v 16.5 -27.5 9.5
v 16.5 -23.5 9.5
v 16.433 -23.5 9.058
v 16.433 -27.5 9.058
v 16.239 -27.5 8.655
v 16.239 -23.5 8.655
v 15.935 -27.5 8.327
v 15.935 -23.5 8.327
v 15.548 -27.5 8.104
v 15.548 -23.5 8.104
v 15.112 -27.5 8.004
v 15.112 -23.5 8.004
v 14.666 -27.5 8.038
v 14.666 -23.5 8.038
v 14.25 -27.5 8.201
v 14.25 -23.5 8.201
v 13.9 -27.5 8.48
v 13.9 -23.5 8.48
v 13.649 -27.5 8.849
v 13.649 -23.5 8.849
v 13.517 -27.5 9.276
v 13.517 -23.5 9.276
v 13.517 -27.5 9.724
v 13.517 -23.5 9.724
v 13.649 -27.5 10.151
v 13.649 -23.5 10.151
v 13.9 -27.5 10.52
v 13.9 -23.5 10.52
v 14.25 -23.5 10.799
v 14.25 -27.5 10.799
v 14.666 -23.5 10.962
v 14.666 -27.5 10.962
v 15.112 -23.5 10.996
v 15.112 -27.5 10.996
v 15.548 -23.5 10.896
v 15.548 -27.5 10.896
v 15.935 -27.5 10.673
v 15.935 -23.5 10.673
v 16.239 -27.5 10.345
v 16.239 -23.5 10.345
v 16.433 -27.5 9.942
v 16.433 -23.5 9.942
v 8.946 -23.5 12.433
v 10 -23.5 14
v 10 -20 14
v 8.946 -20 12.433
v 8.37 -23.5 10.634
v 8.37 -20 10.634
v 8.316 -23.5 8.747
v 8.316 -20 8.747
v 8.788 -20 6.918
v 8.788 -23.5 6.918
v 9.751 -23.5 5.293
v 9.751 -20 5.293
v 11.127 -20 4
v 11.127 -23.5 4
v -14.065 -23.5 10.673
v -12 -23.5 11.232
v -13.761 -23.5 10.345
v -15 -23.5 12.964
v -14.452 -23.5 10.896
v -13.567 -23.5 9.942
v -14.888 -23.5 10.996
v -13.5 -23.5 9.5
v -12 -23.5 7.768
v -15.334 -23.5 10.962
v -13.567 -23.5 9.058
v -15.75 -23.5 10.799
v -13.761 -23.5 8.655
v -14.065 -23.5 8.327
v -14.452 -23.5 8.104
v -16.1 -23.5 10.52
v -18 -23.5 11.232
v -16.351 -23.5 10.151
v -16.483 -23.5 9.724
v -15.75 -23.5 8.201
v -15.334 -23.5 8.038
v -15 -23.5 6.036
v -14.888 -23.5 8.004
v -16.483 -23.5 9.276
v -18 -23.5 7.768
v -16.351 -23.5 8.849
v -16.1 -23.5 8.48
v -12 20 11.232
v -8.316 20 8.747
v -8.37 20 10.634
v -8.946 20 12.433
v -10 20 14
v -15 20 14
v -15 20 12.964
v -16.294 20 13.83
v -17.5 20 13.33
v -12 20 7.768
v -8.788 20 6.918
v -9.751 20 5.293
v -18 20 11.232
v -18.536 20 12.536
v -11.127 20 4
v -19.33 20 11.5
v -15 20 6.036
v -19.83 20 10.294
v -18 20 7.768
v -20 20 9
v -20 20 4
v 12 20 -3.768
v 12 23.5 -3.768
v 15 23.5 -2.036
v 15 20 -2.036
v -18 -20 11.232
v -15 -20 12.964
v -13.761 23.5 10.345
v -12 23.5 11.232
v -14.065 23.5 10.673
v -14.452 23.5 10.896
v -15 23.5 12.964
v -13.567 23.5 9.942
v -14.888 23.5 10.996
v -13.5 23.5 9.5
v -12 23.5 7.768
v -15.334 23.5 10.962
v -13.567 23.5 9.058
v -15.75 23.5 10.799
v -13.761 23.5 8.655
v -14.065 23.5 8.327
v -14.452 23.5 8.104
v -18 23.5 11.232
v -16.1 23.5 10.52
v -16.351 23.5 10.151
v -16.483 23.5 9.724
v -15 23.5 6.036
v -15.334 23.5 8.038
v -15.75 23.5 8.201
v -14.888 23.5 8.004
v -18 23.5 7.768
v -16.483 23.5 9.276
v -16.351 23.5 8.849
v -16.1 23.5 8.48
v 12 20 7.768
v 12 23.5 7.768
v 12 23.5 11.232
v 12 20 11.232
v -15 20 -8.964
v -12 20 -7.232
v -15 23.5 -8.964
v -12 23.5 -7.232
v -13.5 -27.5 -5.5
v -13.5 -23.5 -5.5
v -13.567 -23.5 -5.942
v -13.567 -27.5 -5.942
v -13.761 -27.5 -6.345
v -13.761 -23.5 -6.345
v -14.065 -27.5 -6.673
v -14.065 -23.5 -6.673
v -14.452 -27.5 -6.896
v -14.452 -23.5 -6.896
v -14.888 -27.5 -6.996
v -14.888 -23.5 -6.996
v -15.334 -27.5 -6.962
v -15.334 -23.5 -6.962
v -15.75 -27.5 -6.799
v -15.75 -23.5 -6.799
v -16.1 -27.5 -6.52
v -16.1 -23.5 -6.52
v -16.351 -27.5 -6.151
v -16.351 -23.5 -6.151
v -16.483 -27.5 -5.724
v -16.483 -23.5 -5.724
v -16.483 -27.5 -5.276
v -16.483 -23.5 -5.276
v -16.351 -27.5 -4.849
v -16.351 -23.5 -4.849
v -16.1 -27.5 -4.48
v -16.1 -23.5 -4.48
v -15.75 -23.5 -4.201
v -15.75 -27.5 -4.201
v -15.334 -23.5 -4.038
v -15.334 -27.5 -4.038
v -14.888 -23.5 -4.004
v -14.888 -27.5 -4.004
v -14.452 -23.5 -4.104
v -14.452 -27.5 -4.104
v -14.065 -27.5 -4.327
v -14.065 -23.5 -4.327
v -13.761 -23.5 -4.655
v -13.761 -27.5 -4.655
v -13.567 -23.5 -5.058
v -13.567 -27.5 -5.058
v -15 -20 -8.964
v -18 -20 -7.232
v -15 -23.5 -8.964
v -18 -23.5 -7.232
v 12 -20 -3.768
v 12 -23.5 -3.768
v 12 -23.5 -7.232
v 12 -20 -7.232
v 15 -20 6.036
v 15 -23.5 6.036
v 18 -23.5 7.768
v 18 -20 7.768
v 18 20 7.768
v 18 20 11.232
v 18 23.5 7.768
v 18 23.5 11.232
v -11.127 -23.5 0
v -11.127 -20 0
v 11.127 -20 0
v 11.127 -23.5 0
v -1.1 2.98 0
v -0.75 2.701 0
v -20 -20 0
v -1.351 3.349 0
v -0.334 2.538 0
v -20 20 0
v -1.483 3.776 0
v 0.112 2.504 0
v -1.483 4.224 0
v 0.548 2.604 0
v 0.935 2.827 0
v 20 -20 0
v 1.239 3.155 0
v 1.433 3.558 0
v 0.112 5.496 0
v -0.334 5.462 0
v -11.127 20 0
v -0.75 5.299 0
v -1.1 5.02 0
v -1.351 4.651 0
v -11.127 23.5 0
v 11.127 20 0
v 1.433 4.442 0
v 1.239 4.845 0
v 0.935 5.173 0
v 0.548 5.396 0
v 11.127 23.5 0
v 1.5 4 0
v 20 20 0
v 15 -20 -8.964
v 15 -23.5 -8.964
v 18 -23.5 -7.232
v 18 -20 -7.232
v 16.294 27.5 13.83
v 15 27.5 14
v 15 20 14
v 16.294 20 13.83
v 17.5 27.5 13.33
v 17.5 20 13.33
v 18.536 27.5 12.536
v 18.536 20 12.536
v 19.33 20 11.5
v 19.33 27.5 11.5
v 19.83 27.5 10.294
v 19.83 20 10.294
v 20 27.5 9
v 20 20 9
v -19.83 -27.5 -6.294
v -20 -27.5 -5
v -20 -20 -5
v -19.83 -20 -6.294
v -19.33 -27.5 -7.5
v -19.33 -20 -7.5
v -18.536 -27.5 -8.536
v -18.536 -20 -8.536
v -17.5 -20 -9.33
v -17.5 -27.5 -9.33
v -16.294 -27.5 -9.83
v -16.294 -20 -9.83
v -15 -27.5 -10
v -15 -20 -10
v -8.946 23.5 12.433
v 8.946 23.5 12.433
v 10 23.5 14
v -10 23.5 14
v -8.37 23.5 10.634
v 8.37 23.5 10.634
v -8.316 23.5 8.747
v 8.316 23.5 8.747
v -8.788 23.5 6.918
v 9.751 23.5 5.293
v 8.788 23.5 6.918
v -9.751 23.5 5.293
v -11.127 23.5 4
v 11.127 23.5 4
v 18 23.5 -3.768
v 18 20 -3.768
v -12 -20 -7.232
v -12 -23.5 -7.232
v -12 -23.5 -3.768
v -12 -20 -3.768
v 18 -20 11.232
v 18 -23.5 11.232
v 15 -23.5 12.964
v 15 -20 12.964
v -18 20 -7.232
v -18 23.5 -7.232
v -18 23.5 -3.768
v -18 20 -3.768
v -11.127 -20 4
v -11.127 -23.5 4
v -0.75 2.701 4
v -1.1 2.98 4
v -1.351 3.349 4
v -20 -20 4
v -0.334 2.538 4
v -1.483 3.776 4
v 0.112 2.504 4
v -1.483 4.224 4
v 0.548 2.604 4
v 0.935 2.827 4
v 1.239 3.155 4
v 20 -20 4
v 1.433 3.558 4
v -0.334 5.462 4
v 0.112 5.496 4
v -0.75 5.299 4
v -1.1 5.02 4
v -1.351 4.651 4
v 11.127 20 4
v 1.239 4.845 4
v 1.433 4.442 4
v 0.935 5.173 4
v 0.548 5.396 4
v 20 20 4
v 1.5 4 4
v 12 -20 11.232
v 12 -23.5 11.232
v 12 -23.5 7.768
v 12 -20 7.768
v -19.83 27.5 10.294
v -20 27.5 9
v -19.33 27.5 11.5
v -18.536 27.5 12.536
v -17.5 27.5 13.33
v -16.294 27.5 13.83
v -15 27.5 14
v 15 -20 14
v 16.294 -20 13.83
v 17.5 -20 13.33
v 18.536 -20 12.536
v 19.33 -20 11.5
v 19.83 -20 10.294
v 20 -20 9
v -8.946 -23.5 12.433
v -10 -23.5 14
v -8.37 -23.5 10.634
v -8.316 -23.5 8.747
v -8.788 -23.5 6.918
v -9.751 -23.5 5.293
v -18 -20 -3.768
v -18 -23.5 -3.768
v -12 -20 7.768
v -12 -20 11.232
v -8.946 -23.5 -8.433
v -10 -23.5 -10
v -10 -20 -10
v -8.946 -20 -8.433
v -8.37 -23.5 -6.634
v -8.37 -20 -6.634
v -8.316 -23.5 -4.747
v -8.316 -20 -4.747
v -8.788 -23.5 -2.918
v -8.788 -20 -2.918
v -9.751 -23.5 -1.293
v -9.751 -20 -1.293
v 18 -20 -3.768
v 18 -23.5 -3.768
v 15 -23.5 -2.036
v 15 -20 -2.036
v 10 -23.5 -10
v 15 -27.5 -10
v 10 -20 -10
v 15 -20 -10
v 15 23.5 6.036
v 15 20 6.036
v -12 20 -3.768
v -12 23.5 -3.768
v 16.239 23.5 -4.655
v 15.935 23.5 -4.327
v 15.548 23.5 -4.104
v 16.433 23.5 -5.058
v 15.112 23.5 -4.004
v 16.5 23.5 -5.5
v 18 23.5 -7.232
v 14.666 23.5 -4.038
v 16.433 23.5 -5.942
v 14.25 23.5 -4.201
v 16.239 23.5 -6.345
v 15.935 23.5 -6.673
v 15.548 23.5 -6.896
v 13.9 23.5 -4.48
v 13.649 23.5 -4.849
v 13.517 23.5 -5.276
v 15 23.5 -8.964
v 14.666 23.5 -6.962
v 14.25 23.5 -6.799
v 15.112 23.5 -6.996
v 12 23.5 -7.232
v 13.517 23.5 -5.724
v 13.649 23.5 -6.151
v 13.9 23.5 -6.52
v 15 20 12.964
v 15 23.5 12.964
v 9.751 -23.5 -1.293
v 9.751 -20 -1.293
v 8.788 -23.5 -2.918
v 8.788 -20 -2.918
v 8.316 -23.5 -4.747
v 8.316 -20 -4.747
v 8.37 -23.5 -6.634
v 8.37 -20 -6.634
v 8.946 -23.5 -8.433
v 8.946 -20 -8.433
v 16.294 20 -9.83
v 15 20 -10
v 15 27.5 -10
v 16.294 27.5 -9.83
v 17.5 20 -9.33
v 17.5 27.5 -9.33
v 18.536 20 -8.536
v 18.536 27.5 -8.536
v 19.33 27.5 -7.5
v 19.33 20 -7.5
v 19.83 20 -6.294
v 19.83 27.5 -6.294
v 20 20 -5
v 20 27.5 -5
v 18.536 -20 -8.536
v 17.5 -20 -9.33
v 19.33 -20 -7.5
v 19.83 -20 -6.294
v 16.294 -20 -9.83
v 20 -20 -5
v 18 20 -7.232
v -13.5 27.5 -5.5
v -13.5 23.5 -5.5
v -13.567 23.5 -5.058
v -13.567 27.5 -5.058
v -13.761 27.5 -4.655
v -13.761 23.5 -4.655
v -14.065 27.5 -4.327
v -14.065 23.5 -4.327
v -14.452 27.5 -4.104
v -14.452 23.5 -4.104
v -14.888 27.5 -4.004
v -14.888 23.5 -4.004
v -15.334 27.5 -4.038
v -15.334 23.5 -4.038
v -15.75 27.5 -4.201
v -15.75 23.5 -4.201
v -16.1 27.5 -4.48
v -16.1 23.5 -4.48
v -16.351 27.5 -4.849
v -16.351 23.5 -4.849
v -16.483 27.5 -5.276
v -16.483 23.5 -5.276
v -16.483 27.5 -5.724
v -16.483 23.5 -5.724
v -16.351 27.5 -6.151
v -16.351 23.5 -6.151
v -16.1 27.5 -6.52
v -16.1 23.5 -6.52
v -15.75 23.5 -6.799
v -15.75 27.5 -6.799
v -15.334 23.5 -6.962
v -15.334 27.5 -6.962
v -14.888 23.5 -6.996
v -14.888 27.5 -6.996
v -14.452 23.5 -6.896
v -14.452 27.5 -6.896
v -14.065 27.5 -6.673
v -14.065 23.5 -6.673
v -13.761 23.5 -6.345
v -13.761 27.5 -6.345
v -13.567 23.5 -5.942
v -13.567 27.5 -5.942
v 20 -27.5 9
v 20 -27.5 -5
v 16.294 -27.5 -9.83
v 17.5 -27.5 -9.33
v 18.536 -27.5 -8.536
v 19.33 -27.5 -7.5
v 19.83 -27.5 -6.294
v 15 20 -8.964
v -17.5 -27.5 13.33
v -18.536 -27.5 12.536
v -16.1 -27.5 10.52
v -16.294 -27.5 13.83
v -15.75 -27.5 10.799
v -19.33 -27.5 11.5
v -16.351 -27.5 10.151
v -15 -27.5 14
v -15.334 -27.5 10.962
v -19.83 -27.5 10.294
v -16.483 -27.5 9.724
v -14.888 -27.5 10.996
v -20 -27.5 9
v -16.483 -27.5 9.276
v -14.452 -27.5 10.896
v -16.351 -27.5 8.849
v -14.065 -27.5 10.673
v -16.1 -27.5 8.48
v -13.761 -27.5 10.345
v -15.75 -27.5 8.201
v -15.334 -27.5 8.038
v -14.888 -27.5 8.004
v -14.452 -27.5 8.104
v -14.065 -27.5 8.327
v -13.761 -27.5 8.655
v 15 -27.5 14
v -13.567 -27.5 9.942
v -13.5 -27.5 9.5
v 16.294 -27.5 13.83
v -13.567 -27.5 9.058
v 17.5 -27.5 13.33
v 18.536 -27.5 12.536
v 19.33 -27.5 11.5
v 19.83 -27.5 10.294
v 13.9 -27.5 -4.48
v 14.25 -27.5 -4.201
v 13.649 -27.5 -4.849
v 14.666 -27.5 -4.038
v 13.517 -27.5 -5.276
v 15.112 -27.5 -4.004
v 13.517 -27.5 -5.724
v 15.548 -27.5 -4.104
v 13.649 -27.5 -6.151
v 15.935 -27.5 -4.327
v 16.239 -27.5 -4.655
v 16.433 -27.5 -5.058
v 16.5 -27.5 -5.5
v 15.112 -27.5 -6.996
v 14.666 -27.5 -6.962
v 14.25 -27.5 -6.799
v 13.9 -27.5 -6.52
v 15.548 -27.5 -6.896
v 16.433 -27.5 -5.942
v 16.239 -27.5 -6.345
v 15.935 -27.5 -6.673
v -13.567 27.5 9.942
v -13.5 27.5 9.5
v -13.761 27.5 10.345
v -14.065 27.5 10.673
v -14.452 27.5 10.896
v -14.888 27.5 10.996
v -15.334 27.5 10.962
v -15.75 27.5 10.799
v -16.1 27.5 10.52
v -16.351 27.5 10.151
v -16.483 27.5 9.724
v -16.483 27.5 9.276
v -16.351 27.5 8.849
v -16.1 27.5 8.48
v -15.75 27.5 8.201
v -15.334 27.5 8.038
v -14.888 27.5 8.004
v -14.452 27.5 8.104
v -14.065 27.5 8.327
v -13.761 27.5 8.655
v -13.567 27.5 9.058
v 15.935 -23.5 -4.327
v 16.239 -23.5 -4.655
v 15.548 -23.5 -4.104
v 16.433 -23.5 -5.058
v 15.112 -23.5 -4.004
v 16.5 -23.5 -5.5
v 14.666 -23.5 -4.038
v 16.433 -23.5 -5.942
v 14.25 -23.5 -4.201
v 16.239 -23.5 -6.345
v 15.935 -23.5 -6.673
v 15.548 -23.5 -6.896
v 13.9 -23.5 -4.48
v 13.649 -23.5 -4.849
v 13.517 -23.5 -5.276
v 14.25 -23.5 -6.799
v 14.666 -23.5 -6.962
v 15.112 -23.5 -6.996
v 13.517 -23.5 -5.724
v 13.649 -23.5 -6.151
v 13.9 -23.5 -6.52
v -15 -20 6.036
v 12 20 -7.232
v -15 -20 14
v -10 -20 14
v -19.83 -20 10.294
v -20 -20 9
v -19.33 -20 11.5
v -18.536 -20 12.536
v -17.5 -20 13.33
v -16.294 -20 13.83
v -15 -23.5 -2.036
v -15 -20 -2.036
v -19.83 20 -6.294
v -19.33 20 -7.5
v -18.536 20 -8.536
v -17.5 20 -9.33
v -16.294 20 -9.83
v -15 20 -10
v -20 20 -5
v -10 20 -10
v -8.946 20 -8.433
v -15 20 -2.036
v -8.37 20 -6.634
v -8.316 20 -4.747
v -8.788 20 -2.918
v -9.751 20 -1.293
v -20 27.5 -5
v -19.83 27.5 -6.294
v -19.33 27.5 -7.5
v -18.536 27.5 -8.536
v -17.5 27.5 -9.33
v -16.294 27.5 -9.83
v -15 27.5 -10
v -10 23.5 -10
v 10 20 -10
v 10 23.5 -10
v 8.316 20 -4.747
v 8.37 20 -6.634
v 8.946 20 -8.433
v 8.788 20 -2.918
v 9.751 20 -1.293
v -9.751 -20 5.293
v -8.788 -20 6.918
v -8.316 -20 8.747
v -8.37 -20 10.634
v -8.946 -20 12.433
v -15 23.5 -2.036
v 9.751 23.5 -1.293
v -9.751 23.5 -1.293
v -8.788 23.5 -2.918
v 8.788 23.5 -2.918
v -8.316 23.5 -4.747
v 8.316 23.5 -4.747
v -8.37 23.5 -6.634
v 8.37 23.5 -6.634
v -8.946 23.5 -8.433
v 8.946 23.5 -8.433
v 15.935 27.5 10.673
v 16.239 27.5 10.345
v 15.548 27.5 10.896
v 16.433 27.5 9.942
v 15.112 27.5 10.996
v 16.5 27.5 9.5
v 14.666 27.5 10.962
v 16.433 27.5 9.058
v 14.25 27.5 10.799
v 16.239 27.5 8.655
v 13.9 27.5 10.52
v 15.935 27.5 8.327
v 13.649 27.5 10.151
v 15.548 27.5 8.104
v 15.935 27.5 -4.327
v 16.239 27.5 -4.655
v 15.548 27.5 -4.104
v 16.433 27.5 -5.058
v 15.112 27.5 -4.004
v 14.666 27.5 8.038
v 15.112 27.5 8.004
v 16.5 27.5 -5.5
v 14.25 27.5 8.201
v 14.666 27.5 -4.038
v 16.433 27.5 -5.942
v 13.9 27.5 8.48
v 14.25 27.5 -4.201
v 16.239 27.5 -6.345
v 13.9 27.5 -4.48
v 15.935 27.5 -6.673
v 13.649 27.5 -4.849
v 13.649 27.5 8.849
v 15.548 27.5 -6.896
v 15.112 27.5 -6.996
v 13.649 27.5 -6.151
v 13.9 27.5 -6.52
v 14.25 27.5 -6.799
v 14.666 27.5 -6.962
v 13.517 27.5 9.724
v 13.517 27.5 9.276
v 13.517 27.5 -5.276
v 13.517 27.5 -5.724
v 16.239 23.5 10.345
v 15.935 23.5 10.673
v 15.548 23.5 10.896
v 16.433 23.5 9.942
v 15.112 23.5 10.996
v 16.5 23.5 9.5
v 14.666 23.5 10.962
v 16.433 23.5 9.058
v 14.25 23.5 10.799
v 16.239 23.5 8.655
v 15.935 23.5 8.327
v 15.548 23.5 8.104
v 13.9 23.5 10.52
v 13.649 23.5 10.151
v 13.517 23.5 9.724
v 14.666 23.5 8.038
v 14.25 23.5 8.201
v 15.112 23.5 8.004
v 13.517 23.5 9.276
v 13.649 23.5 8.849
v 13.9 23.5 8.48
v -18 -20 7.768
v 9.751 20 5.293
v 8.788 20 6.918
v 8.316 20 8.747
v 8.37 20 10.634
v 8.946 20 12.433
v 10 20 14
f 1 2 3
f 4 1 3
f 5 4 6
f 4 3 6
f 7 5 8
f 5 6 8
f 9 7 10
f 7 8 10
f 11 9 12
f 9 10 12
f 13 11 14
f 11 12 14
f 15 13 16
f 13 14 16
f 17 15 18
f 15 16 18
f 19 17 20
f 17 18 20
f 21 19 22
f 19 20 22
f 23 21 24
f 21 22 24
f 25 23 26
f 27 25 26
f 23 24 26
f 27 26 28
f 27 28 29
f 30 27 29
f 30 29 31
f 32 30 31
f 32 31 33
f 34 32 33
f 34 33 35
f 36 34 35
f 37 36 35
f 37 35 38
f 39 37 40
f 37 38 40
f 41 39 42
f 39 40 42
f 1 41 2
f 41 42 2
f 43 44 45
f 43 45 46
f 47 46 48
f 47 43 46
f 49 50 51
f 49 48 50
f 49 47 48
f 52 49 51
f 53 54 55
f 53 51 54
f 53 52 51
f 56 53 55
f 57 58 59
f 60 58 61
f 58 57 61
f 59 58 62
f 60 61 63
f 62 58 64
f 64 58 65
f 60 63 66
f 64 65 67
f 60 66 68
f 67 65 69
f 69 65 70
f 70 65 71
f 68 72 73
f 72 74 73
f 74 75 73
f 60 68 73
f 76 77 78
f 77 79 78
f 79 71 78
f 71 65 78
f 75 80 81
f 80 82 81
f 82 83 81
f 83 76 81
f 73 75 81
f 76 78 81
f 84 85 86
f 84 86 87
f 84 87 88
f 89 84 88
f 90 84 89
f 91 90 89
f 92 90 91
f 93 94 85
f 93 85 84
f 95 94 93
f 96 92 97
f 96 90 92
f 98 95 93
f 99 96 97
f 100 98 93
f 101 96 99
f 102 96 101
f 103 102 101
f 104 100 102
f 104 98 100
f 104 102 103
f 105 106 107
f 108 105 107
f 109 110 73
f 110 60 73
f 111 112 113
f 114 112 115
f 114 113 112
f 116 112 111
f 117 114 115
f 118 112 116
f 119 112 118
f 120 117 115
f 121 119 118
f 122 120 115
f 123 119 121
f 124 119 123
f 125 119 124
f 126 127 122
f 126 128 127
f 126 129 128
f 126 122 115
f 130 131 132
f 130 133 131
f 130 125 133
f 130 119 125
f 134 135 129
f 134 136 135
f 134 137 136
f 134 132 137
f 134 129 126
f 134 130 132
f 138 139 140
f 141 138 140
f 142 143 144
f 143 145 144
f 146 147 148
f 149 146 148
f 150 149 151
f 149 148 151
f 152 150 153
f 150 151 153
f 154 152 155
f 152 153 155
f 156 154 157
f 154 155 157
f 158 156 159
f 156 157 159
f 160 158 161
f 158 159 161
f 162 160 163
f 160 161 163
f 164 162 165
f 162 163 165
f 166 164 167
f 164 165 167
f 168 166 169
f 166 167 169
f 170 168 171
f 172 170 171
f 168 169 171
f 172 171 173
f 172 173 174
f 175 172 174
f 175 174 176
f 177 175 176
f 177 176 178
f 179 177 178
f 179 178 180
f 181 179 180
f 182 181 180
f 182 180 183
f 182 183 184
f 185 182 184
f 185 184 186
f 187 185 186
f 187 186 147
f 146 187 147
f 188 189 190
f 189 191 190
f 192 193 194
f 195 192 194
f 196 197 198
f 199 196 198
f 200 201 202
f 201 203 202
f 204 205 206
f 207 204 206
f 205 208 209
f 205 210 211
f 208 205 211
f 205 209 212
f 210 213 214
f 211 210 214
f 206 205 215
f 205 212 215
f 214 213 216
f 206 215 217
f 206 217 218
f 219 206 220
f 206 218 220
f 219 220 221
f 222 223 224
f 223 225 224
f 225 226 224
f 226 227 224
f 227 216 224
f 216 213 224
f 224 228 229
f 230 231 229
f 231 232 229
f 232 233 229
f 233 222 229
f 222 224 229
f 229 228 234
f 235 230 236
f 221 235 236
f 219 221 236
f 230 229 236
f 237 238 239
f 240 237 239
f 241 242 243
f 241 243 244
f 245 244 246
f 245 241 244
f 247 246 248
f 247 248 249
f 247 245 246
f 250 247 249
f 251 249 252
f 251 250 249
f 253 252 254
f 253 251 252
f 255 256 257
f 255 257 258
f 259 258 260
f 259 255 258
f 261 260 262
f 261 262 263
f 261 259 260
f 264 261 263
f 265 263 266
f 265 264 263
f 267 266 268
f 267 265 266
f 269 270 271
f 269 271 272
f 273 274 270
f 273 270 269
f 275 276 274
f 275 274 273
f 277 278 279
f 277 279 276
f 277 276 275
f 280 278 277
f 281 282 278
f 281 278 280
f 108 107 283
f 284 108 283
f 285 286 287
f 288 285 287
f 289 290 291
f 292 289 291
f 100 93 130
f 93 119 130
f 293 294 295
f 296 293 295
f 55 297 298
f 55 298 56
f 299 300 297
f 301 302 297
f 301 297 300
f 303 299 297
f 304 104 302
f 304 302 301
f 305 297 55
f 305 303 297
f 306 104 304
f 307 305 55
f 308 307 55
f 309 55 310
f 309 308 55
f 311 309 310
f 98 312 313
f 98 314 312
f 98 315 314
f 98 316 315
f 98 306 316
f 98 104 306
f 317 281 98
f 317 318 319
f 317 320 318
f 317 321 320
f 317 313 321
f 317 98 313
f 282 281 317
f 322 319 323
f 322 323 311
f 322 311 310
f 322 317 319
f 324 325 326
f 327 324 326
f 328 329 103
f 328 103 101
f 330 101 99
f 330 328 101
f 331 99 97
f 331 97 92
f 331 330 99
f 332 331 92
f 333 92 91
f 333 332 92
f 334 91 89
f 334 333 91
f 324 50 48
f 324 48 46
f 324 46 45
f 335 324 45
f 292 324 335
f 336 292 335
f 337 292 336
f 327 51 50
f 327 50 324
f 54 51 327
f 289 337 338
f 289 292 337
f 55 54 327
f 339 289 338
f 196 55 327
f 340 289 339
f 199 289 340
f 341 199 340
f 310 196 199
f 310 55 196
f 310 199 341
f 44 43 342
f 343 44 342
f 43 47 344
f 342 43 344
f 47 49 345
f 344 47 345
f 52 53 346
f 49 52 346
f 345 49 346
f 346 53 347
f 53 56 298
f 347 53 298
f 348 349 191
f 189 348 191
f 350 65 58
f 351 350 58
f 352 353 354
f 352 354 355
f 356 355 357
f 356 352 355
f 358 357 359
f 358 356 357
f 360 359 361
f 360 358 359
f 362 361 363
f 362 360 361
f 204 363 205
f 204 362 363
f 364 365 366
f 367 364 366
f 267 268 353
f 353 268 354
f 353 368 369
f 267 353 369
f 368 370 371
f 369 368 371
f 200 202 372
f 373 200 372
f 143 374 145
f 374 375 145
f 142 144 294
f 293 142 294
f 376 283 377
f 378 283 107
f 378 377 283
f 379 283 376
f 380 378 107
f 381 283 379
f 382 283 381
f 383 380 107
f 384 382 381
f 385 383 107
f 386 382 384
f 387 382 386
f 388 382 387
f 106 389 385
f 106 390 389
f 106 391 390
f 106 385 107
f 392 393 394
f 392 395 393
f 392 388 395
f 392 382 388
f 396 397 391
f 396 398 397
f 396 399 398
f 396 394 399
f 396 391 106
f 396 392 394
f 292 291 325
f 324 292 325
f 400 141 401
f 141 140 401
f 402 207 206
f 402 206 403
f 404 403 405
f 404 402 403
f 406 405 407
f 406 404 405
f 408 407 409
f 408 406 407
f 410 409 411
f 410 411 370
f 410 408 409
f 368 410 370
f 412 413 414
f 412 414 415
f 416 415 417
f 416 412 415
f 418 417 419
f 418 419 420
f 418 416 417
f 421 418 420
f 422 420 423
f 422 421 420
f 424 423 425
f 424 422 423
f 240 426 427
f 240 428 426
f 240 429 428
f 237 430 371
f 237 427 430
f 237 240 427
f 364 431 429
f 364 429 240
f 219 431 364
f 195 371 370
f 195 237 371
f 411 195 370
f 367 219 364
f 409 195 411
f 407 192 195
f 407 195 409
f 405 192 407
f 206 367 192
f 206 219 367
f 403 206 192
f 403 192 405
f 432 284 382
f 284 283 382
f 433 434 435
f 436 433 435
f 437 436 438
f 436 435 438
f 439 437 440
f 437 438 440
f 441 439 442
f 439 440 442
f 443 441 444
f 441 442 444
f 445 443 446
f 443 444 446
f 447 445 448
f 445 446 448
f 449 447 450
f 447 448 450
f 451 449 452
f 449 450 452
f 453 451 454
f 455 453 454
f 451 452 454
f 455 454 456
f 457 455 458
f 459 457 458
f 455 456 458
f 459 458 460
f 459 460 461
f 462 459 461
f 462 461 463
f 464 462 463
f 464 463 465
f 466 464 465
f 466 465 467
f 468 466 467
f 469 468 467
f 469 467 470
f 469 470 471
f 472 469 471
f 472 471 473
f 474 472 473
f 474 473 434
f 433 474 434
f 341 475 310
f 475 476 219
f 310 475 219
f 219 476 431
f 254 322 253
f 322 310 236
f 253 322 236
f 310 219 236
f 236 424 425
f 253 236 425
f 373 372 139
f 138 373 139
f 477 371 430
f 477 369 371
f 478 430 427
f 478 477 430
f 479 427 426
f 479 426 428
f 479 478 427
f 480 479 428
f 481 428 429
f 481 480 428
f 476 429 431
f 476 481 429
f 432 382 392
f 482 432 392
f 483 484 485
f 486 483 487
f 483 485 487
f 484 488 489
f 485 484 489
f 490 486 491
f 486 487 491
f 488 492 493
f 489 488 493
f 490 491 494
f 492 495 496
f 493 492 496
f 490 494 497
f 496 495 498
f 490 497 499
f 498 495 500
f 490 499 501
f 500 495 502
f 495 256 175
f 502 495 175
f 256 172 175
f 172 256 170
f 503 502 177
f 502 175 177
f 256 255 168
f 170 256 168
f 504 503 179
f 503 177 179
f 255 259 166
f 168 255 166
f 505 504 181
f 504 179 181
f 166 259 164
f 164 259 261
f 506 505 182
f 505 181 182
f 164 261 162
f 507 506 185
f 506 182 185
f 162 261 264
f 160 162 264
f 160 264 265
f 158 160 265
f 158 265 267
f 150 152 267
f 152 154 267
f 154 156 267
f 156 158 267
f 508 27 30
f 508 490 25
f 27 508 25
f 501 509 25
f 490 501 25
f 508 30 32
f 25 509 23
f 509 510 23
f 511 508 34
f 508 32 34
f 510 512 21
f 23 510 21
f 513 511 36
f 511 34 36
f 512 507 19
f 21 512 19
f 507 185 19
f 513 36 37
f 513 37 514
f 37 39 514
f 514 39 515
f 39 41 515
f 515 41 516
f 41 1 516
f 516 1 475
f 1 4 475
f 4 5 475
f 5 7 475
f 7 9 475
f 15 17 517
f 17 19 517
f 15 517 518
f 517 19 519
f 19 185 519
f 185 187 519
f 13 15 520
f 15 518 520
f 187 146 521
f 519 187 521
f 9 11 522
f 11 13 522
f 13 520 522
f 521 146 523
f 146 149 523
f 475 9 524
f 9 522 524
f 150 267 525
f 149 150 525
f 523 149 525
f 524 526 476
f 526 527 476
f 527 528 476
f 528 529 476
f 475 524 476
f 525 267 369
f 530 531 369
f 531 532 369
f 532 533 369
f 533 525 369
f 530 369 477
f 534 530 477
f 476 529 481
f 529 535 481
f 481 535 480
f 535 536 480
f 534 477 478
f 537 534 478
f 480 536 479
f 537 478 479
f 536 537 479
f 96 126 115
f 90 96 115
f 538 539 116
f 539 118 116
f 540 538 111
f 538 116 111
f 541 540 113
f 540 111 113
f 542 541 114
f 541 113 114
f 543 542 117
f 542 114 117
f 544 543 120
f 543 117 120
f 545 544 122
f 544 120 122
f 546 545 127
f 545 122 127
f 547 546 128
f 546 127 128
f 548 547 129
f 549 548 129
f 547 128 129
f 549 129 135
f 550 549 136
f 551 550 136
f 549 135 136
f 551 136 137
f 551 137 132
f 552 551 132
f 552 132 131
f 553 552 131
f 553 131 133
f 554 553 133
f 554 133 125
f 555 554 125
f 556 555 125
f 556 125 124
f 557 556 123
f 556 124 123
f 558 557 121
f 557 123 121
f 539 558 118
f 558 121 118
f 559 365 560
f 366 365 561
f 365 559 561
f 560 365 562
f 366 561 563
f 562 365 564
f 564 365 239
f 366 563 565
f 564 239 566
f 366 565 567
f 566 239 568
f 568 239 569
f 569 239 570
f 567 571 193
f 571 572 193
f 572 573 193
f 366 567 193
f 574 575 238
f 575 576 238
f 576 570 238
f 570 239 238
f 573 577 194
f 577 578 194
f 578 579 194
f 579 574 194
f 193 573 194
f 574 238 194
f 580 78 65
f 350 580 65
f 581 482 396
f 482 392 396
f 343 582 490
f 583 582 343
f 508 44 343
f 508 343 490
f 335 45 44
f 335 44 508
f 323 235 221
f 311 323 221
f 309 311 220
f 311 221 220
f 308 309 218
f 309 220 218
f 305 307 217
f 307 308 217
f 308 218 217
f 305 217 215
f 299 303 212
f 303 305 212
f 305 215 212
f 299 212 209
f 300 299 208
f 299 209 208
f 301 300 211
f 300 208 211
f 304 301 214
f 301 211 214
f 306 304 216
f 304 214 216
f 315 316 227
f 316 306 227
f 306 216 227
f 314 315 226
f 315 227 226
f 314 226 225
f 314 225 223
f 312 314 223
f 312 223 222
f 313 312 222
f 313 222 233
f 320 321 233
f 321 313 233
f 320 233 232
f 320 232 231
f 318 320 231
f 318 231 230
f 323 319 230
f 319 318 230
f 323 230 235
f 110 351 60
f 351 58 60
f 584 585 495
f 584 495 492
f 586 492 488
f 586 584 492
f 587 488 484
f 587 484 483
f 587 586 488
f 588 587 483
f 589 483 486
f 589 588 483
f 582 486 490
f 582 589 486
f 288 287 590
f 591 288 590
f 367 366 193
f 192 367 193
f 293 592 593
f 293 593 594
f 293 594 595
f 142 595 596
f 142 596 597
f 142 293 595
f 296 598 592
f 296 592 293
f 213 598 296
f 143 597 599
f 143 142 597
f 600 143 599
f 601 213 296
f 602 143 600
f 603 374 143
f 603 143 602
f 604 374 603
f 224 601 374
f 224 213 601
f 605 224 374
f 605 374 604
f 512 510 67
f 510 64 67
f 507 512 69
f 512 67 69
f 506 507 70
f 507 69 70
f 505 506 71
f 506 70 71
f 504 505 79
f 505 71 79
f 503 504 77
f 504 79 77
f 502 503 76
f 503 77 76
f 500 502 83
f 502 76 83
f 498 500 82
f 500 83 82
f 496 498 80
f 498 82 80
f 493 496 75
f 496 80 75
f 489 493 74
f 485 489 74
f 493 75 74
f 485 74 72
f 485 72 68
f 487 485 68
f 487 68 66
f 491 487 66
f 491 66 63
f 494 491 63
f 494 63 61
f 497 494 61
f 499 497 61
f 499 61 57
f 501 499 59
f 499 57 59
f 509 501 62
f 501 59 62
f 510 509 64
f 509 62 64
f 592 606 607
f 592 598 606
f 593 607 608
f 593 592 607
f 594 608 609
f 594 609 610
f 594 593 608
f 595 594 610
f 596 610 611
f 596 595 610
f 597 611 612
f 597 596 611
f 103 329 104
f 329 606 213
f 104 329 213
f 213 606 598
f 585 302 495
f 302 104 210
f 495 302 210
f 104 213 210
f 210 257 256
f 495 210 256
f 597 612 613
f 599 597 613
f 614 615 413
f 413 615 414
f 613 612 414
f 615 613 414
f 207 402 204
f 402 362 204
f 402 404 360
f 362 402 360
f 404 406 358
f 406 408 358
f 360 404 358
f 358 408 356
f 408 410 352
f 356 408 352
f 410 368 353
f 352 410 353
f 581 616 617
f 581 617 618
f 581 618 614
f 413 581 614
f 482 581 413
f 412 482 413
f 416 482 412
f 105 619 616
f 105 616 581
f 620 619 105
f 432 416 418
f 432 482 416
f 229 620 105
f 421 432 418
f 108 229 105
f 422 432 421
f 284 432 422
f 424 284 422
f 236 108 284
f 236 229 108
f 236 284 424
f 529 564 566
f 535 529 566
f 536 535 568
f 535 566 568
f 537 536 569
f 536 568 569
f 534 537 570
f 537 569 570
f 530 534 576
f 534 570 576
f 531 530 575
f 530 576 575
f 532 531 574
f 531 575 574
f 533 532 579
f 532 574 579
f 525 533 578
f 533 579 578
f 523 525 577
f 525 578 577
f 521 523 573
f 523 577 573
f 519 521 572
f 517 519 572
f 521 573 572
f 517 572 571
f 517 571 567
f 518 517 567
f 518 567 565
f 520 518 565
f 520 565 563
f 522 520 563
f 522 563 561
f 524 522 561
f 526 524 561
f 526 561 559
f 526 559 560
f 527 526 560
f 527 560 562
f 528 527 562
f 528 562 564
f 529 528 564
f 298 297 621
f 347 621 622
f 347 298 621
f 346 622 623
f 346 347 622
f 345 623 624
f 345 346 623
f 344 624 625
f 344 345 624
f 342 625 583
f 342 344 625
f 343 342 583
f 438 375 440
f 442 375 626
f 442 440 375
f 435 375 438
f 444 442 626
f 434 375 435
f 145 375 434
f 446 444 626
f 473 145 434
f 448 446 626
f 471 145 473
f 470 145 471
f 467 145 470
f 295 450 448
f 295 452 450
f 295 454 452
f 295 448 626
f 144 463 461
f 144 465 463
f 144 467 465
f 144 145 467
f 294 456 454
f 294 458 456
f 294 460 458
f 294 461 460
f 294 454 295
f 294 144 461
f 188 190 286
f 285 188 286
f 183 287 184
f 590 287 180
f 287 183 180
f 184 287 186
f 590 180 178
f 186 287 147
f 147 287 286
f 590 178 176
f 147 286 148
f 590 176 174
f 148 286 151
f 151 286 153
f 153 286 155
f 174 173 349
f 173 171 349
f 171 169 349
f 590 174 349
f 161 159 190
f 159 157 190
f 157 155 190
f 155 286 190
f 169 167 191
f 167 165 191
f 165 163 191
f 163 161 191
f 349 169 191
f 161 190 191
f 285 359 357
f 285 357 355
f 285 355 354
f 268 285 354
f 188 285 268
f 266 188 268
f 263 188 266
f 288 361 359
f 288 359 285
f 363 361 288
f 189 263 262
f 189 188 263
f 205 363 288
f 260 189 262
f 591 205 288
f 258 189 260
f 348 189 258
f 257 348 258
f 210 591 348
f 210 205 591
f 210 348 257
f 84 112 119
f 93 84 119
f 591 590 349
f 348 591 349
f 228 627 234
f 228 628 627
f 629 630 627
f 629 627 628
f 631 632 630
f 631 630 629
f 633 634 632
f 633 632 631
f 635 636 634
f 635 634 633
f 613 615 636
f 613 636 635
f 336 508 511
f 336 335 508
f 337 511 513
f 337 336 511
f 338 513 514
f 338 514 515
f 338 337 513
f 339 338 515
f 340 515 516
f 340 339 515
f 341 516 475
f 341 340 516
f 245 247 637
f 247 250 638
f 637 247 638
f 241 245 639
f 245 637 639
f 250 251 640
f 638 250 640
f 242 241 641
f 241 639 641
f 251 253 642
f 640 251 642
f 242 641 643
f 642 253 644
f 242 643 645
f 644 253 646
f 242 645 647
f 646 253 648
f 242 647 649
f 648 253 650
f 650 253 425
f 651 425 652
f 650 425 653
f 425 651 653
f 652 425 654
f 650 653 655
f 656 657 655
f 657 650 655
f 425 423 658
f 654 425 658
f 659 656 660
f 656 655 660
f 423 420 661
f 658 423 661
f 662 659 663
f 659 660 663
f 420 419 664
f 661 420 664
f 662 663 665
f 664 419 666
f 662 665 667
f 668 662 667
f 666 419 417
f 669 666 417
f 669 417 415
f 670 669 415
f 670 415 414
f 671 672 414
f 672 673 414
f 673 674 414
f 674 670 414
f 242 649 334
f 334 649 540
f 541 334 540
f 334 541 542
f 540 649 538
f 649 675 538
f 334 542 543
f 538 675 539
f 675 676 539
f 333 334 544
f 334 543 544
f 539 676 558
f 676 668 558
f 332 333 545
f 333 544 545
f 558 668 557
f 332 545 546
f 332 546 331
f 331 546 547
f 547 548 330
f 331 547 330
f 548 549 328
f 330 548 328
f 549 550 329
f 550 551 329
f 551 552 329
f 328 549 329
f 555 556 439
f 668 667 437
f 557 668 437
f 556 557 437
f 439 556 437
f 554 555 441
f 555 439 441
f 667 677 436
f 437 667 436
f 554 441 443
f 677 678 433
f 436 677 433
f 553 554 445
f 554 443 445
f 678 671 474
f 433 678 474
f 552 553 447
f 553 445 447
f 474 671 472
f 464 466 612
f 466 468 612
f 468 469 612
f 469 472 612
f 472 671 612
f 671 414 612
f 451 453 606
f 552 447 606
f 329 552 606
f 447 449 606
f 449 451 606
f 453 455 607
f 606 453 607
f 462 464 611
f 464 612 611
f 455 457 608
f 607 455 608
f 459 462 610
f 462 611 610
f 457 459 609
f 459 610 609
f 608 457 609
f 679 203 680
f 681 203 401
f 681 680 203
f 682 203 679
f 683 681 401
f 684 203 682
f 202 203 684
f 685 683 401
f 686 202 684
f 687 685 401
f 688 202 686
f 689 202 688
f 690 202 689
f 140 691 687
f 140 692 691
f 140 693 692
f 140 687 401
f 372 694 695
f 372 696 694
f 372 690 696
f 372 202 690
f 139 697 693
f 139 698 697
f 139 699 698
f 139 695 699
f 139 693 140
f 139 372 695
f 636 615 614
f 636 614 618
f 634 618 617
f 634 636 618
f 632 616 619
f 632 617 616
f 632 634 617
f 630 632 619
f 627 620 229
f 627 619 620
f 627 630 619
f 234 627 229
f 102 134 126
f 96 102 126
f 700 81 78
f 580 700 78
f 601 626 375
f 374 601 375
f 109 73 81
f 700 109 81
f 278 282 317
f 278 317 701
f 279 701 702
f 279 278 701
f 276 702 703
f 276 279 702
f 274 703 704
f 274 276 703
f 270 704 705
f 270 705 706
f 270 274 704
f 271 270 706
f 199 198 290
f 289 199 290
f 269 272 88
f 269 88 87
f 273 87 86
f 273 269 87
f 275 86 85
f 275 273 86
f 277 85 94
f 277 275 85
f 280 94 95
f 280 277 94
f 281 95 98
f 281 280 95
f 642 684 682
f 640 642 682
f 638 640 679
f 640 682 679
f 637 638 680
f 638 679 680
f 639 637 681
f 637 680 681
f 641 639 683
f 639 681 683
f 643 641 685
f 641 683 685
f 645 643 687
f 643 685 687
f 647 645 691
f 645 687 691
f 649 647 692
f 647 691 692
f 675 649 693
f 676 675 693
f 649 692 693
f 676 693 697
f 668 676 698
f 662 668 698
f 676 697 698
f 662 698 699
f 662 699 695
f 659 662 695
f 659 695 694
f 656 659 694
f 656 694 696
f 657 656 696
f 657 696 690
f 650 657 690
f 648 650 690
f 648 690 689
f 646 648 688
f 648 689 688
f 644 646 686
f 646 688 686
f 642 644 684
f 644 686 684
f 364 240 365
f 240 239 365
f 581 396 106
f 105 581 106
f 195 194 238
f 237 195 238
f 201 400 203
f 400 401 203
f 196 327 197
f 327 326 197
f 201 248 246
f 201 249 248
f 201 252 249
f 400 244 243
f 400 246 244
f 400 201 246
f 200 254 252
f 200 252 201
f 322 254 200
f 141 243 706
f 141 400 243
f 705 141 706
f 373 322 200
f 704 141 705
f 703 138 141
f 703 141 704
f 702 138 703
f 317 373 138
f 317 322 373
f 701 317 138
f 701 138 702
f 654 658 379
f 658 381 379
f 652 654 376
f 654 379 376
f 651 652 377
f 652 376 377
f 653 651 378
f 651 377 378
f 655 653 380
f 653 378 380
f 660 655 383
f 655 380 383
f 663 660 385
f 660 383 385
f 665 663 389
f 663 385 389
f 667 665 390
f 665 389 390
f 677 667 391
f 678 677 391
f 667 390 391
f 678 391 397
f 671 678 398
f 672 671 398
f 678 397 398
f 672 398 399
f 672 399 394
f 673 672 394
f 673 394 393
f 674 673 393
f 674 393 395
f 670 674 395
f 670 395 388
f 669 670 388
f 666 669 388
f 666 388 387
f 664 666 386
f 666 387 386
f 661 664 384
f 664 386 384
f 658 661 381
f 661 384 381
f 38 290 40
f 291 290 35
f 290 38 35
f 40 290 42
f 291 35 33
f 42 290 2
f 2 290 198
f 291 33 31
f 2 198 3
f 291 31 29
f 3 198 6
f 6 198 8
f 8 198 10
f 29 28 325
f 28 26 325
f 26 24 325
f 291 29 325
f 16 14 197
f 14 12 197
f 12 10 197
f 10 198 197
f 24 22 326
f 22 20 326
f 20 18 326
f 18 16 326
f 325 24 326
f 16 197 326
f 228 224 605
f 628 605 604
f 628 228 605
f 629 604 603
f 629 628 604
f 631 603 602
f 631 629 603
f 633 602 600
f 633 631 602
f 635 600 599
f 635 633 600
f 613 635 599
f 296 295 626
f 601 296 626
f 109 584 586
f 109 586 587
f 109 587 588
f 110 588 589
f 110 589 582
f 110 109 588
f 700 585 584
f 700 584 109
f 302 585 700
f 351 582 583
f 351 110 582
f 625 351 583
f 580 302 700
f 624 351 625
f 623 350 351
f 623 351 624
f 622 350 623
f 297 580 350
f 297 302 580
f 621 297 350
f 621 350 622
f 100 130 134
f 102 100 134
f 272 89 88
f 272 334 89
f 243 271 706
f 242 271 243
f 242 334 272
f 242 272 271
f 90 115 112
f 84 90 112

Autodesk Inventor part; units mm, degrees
ref_plane "YZ Plane" through (0, 0, 0) normal (1, 0, 0) x (0, 1, 0)
sketch "Sketch4" plane through (0, 0, 0) normal (0, 0, 1) x (1, 0, 0)
  line L0 (-20, -27.5) -> (20, -27.5)
  line L1 (20, -27.5) -> (20, 27.5)
  line L2 (20, 27.5) -> (-20, 27.5)
  line L3 (-20, 27.5) -> (-20, -27.5)
  line L4 (-20, -27.5) -> (20, 27.5) construction
  line L5 (20, -27.5) -> (-20, 27.5) construction
  circle A0 centre (0, 4) radius 1.5
  line L6 (-20, 27.5) -> (20, 27.5)
  line L7 (20, 27.5) -> (20, 23.5)
  line L8 (20, 23.5) -> (-20, 23.5)
  line L9 (-20, 23.5) -> (-20, 27.5)
  line L10 (-20, -27.5) -> (20, -27.5)
  line L11 (20, -27.5) -> (20, -23.5)
  line L12 (20, -23.5) -> (-20, -23.5)
  line L13 (-20, -23.5) -> (-20, -27.5)
  point P0 (0, 0)
  point P1 (-20, -23.5)
  dimension "d33" = 55
  dimension "d34" = 40
  dimension "d35" = 3
  dimension "d36" = 4
  dimension "d37" = 4
  dimension "d38" = 4
extrude "Extrusion4" add sketch "Sketch4" along normal blind 4 contours L3 L8 L1 L12
extrude "Extrusion5" add sketch "Sketch4" along normal blind 14 and the other way blind 10 contours L3 L12 L1 L0 | L3 L2 L1 L8
sketch "Sketch5" plane through (-20, -23.5, 4) normal (0, 1, 0) x (1, 0, 0)
  line L0 (0, 14) -> (0, -10) projected
  line L1 (0, 2) -> (40, 2)
  line L2 (40, 14) -> (40, -10) projected
  line L3 (5, -5.5) -> (35, -5.5)
  line L4 (35, -5.5) -> (35, 9.5)
  line L5 (35, 9.5) -> (5, 9.5)
  line L6 (5, 9.5) -> (5, -5.5)
  line L7 (5, -5.5) -> (35, 9.5) construction
  line L8 (35, -5.5) -> (5, 9.5) construction
  circle A0 centre (5, 9.5) radius 1.5
  circle A1 centre (35, 9.5) radius 1.5
  circle A2 centre (35, -5.5) radius 1.5
  circle A3 centre (5, -5.5) radius 1.5
  point P0 (20, 4)
  point P1 (20, 2)
  dimension "d45" = 15
  dimension "d46" = 30
  dimension "d47" = 3
  dimension "d48" = 3
  dimension "d49" = 3
  dimension "d50" = 3
extrude "Extrusion6" cut sketch "Sketch5" against normal blind 14 contours A0 L5 L6 | L6 L5 A0 | A3 L3 L6 | L6 L3 A3 | A2 L3 L4 | L4 L3 A2 | A1 L5 L4 | L4 L5 A1
sketch "Sketch6" plane through (-20, -23.5, 4) normal (0, 1, 0) x (1, 0, 0)
  circle A0 centre (5, -5.5) radius 1.5 projected
  line L0 (5, -2.0359) -> (8, -3.7679)
  line L1 (8, -3.7679) -> (8, -7.2321)
  line L2 (8, -7.2321) -> (5, -8.9641)
  line L3 (5, -8.9641) -> (2, -7.2321)
  line L4 (2, -7.2321) -> (2, -3.7679)
  line L5 (2, -3.7679) -> (5, -2.0359)
  circle A1 centre (35, -5.5) radius 1.5 projected
  line L6 (35, -8.9641) -> (32, -7.2321)
  line L7 (32, -7.2321) -> (32, -3.7679)
  line L8 (32, -3.7679) -> (35, -2.0359)
  line L9 (35, -2.0359) -> (38, -3.7679)
  line L10 (38, -3.7679) -> (38, -7.2321)
  line L11 (38, -7.2321) -> (35, -8.9641)
  circle A2 centre (5, -5.5) radius 1.5 projected
  line L12 (40, -10) -> (0, -10) projected
  circle A3 centre (5, -5.5) radius 6.7268
  circle A4 centre (35, -5.5) radius 1.5 projected
  line L13 (40, 14) -> (40, -10) projected
  circle A5 centre (35, -5.5) radius 6.7268
  circle A6 centre (35, -5.5) radius 1.5 projected
  circle A7 centre (5, -5.5) radius 1.5 projected
  line L14 (0, 0) -> (40, 0) projected
  line L15 (0, -10) -> (0, 0) projected
  line L16 (40, -10) -> (0, -10) projected
  line L17 (40, 0) -> (40, -10) projected
  point P0 (20, 4)
  point P1 (38.873, 0)
  point P2 (31.127, 0)
  point P3 (30, -10)
  point P4 (40, -1)
  point P5 (0, -1)
  point P6 (0, -10)
  point P7 (10, -10)
  point P8 (8.873, 0)
  point P9 (1.127, 0)
  dimension "d53" = 6
  dimension "d54" = 6
extrude "Extrusion7" add sketch "Sketch6" along normal blind 3.5 contours L12 A5 L14 L13 | A5 L14 L13 | L12 L15 A3 L14 | L15 L14 A3
ref_plane "Work Plane1" through (0, 0, 2) normal (0, 0, 1) x (1, 0, 0)
mirror "Mirror1" about plane through (0, 0, 2) normal (0, 0, 1) of "Extrusion7"
ref_plane "Work Plane2" through (-11.127, 0, 0) normal (0, 1, 0) x (1, 0, 0)
mirror "Mirror2" about plane through (-11.127, 0, 0) normal (0, 1, 0) of "Extrusion7", "Mirror1", "Extrusion6"
fillet "Fillet2" radius 5 4 edges at (-20, 23.75, 14) (-20, 23.75, -10) (20, 23.75, 14) (20, 23.75, -10)
fillet "Fillet3" radius 5 4 edges at (-20, -23.75, 14) (-20, -23.75, -10) (20, -23.75, 14) (20, -23.75, -10)
properties part number "DriverHolderInside"
